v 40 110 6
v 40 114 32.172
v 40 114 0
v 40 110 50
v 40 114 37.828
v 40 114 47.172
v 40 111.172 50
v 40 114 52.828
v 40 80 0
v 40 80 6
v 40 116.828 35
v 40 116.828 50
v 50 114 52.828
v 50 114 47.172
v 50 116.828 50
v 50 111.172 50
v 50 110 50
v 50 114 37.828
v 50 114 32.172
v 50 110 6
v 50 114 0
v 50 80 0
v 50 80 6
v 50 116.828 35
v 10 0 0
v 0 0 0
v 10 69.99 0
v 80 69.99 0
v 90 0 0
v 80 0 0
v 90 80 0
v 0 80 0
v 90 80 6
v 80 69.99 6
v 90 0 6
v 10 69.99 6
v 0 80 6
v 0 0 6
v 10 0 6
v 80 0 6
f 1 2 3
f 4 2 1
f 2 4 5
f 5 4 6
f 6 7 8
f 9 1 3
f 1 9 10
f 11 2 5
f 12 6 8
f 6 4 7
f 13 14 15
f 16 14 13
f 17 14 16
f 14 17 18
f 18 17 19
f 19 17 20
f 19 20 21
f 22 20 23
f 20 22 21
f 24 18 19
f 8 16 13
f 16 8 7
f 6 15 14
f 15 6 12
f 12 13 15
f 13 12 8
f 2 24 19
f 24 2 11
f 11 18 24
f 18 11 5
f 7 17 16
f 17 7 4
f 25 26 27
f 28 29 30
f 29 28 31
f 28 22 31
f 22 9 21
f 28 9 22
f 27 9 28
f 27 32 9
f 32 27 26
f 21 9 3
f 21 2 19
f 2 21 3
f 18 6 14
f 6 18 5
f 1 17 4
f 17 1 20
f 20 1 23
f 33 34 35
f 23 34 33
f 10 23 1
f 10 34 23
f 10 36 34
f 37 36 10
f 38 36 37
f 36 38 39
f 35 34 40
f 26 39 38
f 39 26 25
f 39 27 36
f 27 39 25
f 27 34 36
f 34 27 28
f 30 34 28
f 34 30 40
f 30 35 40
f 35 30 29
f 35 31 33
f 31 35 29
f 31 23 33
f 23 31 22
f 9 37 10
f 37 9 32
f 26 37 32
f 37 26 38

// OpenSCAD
gap_h = 70;
top_h = 10;
gap_w = 70;
side_w = 10;
total_w = gap_w + side_w * 2;
total_h = gap_h + top_h;
thick = 6;
holder_pos = gap_w * 0.5;
holder_w = 10;
holder_vdist = 30;
holder_out = 50;
holder_t = 4;

linear_extrude(thick)
union() {
    difference() {
        square([total_w, total_h])
            ;
        translate([side_w, -0.01])
        square([gap_w, gap_h])
            ;
    }
        ;
    translate([side_w + holder_pos - holder_w / 2, total_h])
    square([holder_w, holder_vdist])
        ;
}
    ;

translate([side_w + holder_pos - holder_w / 2, total_h + holder_vdist])
union() {
    cube([holder_w, holder_t, holder_out])
        ;
    translate([0, holder_t, holder_out])
    for (v = [0, 15]) {
        translate([holder_w / 2, 0, -v])
        rotate([45, 0, 0])
        cube([holder_w, holder_t, holder_t], center=true)
            ;
    }
        ;
}
    ;
